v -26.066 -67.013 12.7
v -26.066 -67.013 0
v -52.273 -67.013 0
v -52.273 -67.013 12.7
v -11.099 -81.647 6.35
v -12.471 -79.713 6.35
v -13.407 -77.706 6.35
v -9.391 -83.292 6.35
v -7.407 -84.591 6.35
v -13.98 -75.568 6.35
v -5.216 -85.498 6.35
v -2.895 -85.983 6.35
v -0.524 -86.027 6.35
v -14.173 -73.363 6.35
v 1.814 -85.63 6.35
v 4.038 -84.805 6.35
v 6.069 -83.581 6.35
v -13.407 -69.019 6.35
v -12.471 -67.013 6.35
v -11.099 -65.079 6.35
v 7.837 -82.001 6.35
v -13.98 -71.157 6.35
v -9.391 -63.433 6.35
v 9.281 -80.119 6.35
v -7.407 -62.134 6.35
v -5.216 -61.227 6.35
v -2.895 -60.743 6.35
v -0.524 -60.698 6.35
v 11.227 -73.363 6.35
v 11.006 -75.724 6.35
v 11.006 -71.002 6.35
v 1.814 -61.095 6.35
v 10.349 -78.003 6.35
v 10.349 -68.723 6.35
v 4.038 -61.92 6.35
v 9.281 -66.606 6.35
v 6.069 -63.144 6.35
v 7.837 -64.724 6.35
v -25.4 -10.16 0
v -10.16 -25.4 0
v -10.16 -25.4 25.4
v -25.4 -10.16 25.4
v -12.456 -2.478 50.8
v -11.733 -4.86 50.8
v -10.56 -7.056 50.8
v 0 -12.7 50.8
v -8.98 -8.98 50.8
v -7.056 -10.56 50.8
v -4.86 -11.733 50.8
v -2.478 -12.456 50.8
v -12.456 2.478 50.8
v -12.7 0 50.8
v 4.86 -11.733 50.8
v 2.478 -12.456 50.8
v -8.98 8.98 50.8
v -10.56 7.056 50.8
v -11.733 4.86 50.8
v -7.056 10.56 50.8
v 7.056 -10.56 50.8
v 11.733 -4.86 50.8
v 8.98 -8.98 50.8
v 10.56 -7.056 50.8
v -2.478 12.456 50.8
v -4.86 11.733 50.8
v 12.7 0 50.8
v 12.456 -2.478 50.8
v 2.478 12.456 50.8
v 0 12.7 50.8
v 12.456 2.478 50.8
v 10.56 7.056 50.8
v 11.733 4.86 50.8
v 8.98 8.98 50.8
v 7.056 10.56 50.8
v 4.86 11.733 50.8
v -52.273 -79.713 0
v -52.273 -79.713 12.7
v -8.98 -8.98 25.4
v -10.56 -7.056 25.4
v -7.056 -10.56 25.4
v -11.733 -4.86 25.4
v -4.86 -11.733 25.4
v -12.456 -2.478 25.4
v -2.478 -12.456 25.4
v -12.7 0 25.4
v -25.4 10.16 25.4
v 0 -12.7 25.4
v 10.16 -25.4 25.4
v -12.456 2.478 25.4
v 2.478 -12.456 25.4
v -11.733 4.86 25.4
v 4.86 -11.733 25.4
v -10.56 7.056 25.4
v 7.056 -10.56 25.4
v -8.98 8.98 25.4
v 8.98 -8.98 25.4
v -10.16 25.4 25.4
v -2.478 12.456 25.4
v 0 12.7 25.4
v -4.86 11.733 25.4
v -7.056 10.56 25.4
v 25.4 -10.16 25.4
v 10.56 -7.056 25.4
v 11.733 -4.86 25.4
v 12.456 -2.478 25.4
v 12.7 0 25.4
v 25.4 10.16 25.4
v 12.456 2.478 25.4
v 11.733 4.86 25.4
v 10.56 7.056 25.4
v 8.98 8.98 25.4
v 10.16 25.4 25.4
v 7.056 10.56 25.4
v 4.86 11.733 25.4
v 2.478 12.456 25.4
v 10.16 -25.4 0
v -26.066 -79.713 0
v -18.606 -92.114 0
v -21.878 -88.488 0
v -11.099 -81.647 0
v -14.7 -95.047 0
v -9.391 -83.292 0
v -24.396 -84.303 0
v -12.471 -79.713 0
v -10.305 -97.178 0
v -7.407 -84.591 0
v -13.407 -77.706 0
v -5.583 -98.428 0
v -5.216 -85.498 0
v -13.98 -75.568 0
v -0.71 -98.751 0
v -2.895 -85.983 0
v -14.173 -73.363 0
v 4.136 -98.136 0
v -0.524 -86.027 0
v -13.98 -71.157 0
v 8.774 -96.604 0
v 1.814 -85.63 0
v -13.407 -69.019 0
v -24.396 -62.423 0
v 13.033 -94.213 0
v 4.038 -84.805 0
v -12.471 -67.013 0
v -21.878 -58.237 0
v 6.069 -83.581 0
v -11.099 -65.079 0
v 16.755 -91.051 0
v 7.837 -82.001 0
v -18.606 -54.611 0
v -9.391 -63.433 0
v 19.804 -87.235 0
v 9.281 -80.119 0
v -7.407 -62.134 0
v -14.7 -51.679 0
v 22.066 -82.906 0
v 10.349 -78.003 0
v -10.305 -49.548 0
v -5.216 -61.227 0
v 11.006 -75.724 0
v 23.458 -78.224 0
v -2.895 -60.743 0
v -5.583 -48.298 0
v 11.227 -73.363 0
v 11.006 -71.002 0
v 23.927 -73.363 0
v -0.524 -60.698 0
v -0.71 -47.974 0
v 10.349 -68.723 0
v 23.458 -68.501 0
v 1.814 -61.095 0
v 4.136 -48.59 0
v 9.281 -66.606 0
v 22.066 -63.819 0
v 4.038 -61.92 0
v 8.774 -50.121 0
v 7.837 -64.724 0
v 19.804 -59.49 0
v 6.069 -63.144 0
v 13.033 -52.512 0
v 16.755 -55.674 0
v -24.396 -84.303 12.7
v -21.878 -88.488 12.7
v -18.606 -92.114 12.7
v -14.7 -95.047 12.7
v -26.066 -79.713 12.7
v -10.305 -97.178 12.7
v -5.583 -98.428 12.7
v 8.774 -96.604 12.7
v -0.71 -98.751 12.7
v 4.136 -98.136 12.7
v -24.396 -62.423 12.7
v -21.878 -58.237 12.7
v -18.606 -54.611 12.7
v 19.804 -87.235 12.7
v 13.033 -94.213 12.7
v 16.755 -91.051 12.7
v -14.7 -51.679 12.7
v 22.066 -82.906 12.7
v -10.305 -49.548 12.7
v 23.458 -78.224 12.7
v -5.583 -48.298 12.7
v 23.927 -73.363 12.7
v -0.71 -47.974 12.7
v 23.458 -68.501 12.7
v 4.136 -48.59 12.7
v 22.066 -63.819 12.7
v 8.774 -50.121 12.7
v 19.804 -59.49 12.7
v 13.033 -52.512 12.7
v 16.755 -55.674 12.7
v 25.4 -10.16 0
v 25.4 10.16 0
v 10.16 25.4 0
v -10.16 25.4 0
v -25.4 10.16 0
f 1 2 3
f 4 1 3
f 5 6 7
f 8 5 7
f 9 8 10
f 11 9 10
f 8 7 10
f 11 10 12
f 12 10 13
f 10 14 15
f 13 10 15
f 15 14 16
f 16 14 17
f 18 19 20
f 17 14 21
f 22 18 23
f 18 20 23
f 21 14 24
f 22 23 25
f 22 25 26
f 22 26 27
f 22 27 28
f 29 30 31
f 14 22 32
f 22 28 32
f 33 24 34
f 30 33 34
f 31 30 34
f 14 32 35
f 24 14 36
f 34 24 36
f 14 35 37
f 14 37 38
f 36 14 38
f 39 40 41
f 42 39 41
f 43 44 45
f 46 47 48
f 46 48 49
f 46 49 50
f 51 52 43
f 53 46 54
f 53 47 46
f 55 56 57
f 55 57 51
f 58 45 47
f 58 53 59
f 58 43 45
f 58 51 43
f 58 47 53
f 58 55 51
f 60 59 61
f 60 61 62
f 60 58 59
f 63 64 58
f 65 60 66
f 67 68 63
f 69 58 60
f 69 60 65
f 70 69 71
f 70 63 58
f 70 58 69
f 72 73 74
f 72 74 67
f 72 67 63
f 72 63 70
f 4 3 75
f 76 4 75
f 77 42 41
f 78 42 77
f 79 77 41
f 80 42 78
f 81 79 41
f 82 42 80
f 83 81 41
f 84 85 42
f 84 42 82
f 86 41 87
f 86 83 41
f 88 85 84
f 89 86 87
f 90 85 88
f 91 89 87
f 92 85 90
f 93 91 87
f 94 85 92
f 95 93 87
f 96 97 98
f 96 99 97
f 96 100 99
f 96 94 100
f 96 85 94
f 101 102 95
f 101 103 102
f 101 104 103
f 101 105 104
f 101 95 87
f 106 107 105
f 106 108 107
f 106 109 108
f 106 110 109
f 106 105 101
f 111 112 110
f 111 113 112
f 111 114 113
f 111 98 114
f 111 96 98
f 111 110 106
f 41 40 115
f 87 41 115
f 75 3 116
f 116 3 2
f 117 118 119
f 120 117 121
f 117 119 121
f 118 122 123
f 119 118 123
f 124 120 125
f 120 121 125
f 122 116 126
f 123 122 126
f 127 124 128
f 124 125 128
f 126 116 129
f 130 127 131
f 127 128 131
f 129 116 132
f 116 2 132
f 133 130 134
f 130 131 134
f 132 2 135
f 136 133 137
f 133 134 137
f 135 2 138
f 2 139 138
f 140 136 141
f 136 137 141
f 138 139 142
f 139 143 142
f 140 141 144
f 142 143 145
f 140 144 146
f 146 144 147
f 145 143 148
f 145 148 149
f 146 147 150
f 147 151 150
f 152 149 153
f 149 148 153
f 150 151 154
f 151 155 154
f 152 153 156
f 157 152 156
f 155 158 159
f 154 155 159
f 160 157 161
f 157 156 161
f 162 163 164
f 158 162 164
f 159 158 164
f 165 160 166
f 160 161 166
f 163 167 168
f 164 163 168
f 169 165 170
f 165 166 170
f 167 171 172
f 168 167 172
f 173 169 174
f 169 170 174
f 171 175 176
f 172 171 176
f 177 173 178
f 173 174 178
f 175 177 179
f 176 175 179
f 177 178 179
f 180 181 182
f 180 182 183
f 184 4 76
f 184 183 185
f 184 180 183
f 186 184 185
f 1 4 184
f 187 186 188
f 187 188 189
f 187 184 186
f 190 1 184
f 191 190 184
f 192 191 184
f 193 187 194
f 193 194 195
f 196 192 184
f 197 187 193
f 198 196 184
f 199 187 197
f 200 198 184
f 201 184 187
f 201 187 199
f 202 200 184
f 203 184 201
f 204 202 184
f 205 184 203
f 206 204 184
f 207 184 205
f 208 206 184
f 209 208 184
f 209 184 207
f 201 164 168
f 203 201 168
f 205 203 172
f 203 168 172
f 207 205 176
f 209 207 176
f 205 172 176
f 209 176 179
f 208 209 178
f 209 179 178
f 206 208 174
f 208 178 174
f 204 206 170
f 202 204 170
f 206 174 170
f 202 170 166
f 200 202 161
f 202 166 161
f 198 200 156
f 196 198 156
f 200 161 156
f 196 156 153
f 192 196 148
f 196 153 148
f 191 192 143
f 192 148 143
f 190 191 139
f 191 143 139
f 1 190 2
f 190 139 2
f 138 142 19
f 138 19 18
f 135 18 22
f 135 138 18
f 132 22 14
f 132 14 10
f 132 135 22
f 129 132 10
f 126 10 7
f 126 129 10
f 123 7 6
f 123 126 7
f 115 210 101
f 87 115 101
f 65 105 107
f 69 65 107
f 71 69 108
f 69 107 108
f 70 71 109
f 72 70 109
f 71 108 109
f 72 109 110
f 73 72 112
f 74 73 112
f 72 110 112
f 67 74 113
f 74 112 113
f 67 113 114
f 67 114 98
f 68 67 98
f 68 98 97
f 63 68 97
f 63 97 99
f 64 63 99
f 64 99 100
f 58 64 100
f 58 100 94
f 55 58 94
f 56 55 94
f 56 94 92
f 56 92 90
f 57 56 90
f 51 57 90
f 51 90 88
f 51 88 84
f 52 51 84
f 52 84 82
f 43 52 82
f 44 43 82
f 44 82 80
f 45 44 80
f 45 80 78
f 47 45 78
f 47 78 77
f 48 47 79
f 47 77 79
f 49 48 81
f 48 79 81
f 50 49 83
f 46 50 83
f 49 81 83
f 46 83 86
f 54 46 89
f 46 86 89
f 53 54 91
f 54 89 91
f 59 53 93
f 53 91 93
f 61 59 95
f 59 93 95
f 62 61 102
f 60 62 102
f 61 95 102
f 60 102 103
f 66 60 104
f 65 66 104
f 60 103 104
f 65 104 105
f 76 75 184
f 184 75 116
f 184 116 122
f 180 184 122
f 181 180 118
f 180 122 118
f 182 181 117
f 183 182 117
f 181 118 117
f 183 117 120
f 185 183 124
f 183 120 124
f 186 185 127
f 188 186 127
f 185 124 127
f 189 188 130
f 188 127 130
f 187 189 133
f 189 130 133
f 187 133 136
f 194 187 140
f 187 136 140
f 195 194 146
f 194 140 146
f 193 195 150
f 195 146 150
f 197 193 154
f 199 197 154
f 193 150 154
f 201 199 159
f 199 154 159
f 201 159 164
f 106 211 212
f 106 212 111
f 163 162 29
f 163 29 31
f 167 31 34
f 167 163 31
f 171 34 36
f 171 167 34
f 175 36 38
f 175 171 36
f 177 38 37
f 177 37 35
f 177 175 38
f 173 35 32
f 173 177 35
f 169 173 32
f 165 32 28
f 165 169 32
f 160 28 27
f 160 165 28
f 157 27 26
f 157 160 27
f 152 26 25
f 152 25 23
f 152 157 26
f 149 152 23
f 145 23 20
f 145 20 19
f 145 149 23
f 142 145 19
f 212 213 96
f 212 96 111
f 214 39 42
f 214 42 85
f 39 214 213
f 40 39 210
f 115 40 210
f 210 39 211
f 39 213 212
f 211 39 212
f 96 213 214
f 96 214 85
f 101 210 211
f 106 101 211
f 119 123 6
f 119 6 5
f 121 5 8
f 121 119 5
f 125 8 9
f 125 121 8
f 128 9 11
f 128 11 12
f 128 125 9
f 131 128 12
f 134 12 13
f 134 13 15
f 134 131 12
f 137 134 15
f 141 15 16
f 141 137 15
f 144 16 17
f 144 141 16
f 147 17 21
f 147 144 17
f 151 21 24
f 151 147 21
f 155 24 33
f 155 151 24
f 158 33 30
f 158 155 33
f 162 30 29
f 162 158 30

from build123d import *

# Parameters (mm, degrees)
F0_R     = 12.7
F0_W     = 50.8
F0_H     = 50.8
F1_DEPTH = 25.4
F2_DEPTH = 50.8
F3_SIZE  = 15.24
F5_DEPTH = 12.7
F6_DEPTH = 6.35


with BuildPart() as f1:
    # F0 (on Top) → F1 (new body)
    with BuildSketch(Plane.XY):
        Circle(F0_R)
        Rectangle(F0_W, F0_H)
        Circle(F0_R, mode=Mode.SUBTRACT)
    extrude(amount=F1_DEPTH)

    # F0 (on Top) → F2 (join)
    with BuildSketch(Plane.XY):
        Circle(F0_R)
    extrude(amount=F2_DEPTH)

    # F3
    f3_edges = [f1.edges().sort_by_distance(p)[0] for p in [
        (-25.4, -25.4, 12.7),
        (25.4, -25.4, 12.7),
        (25.4, 25.4, 12.7),
        (-25.4, 25.4, 12.7),
    ]]
    chamfer(f3_edges, length=F3_SIZE)


with BuildPart() as f5:
    # F4 (on Top) → F5 (new body)
    with BuildSketch(Plane.XY):
        with BuildLine():
            ThreePointArc((-26.066263, -79.712681), (-26.872819, -73.362681), (-26.066263, -67.012681))
            Line((-26.066263, -67.012681), (-52.272819, -67.012681))
            Line((-52.272819, -67.012681), (-52.272819, -79.712681))
            Line((-52.272819, -79.712681), (-26.066263, -79.712681))
        make_face()
        with BuildLine():
            Line((-12.471342, -67.012681), (-26.066263, -67.012681))
            ThreePointArc((-26.066263, -67.012681), (-26.872819, -73.362681), (-26.066263, -79.712681))
            Line((-26.066263, -79.712681), (-12.471342, -79.712681))
            ThreePointArc((-12.471342, -79.712681), (-14.172819, -73.362681), (-12.471342, -67.012681))
        make_face()
        with BuildLine():
            ThreePointArc((-26.066263, -79.712681), (1.72769, -98.560236), (23.927181, -73.362681))
            ThreePointArc((23.927181, -73.362681), (1.72769, -48.165127), (-26.066263, -67.012681))
            Line((-26.066263, -67.012681), (-12.471342, -67.012681))
            ThreePointArc((-12.471342, -67.012681), (1.814183, -61.095423), (11.227181, -73.362681))
            ThreePointArc((11.227181, -73.362681), (1.814183, -85.629939), (-12.471342, -79.712681))
            Line((-12.471342, -79.712681), (-26.066263, -79.712681))
        make_face()
        with BuildLine():
            Line((-1.472819, -67.012681), (-12.471342, -67.012681))
            ThreePointArc((-12.471342, -67.012681), (-14.172819, -73.362681), (-12.471342, -79.712681))
            Line((-12.471342, -79.712681), (-1.472819, -79.712681))
            Line((-1.472819, -79.712681), (-1.472819, -67.012681))
        make_face()
        with BuildLine():
            ThreePointArc((11.227181, -73.362681), (1.814183, -61.095423), (-12.471342, -67.012681))
            Line((-12.471342, -67.012681), (-1.472819, -67.012681))
            Line((-1.472819, -67.012681), (-1.472819, -79.712681))
            Line((-1.472819, -79.712681), (-12.471342, -79.712681))
            ThreePointArc((-12.471342, -79.712681), (1.814183, -85.629939), (11.227181, -73.362681))
        make_face()
    extrude(amount=F5_DEPTH)

    # F4 (on Top) → F6 (cut)
    with BuildSketch(Plane.XY):
        with BuildLine():
            ThreePointArc((11.227181, -73.362681), (1.814183, -61.095423), (-12.471342, -67.012681))
            Line((-12.471342, -67.012681), (-1.472819, -67.012681))
            Line((-1.472819, -67.012681), (-1.472819, -79.712681))
            Line((-1.472819, -79.712681), (-12.471342, -79.712681))
            ThreePointArc((-12.471342, -79.712681), (1.814183, -85.629939), (11.227181, -73.362681))
        make_face()
        with BuildLine():
            Line((-1.472819, -67.012681), (-12.471342, -67.012681))
            ThreePointArc((-12.471342, -67.012681), (-14.172819, -73.362681), (-12.471342, -79.712681))
            Line((-12.471342, -79.712681), (-1.472819, -79.712681))
            Line((-1.472819, -79.712681), (-1.472819, -67.012681))
        make_face()
    extrude(amount=F6_DEPTH, mode=Mode.SUBTRACT)


solid = Compound([f1.part, f5.part])
